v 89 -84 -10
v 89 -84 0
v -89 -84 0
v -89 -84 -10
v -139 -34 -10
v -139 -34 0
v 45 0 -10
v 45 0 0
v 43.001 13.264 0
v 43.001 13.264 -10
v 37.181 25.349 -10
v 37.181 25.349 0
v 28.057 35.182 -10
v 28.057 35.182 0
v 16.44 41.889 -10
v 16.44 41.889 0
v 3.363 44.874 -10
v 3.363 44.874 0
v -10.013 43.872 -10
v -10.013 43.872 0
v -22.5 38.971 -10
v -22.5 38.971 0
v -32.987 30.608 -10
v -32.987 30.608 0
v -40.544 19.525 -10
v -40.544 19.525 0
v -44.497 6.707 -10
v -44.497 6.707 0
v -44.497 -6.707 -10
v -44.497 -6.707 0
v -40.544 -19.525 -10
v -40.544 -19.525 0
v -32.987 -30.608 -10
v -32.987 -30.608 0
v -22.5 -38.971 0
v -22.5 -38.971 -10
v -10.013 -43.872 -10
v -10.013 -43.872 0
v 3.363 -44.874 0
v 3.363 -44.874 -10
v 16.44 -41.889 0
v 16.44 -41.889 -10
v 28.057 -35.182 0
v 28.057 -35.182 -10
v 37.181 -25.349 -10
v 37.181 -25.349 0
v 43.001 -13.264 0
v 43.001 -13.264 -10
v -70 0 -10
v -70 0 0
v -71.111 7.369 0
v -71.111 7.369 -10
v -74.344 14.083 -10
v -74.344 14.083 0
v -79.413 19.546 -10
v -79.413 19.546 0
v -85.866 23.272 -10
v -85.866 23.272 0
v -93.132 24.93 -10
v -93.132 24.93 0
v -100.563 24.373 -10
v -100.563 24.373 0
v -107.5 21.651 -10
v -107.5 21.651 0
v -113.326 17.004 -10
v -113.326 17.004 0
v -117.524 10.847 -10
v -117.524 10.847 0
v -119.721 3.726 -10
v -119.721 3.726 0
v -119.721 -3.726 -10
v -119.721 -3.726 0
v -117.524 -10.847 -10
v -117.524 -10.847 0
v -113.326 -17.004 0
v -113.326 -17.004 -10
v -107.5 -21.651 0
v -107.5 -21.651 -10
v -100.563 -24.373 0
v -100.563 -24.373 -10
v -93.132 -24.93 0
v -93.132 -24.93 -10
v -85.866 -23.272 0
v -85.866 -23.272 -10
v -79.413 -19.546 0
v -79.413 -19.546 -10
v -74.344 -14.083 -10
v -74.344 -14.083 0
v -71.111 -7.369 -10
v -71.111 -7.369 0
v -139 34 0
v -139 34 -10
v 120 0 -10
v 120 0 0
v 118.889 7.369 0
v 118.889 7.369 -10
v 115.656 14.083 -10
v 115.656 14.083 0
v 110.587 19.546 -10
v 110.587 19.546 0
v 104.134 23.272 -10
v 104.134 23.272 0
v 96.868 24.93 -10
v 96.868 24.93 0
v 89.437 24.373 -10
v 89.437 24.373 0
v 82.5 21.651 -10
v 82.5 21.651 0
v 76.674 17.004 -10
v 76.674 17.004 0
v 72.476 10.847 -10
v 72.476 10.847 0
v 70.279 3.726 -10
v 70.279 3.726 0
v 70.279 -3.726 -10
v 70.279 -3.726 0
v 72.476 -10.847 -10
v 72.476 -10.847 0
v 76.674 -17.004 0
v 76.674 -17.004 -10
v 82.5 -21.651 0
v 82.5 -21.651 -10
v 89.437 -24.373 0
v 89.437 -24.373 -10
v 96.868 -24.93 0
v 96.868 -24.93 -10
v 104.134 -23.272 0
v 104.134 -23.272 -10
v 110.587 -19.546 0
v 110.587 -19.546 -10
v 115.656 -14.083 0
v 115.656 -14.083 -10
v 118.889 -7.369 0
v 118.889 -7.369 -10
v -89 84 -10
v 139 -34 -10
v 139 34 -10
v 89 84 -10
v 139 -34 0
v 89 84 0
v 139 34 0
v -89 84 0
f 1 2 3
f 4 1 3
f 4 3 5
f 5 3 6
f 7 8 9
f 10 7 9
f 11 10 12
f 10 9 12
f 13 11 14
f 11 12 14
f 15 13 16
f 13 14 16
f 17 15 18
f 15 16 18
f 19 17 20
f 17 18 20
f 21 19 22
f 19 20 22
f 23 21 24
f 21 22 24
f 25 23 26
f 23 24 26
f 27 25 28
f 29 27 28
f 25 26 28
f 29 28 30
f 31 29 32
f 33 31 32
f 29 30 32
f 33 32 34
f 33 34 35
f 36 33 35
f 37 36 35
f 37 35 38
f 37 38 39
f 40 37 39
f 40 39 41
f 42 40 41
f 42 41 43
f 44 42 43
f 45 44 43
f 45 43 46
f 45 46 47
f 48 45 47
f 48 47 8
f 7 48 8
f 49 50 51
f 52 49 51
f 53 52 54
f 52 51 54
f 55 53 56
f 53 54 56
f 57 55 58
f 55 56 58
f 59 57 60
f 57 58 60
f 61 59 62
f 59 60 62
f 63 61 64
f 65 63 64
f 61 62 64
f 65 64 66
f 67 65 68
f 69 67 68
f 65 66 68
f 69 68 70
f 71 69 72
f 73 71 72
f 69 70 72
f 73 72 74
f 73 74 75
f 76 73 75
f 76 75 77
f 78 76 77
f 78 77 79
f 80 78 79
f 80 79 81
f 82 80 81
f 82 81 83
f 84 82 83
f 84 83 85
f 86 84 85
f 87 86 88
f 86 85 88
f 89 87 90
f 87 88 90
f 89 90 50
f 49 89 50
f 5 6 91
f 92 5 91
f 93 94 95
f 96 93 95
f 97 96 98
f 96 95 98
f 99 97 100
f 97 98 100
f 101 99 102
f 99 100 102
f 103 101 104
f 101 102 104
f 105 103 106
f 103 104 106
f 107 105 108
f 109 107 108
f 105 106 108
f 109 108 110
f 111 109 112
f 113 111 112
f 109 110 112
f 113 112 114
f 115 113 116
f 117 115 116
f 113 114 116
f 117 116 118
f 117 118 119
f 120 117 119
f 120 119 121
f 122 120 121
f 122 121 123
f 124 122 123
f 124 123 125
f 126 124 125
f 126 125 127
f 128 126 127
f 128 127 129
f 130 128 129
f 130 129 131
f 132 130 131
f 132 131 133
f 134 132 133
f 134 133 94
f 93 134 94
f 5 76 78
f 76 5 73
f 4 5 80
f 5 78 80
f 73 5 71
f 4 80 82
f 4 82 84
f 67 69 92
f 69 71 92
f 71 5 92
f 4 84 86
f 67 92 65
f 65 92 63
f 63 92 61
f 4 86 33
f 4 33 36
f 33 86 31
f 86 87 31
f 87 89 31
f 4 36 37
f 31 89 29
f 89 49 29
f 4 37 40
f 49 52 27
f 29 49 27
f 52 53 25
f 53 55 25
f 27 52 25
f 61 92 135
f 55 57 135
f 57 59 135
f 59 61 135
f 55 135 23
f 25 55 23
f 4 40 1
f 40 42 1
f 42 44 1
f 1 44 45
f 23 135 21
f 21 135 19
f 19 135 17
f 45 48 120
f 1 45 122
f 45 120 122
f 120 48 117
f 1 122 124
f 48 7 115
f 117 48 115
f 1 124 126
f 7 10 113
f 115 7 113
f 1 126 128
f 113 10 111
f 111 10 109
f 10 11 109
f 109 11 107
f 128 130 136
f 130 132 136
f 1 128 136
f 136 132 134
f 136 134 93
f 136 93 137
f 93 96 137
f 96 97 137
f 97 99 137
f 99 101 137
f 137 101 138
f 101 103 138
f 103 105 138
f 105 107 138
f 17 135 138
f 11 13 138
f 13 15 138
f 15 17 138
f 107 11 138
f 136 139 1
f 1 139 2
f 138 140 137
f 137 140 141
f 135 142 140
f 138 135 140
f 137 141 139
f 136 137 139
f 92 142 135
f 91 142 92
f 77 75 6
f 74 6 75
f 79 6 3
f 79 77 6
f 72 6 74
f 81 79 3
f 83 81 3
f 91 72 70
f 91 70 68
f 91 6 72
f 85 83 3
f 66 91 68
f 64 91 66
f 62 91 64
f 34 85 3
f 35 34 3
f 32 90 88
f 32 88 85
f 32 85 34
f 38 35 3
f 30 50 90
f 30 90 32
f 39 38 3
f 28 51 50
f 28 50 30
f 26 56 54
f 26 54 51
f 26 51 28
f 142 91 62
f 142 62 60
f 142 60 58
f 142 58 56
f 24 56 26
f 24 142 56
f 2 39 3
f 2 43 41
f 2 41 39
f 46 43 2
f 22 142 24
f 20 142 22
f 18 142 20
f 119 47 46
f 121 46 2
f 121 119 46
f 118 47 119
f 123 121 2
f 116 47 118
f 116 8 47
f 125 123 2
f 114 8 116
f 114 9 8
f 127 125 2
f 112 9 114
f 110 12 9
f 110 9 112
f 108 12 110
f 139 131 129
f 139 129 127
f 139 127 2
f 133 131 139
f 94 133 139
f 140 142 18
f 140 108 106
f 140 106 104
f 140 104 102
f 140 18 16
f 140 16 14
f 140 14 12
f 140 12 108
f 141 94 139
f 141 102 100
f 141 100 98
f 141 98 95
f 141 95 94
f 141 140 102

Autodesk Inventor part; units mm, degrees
ref_plane "YZ Plane" through (0, 0, 0) normal (1, 0, 0) x (0, 1, 0)
ref_plane "XZ Plane" through (0, 0, 0) normal (0, 1, 0) x (-1, 0, 0)
ref_plane "XY Plane" through (0, 0, 0) normal (0, 0, 1) x (1, 0, 0)
sketch "Sketch1" plane through (0, 0, 0) normal (0, 0, 1) x (1, 0, 0)
  line L0 (0, 117.6) -> (0, -117.6) projected
  line L1 (-194.6, 0) -> (194.6, 0) projected
  line L2 (-89, 84) -> (89, 84)
  line L3 (139, 34) -> (139, -34)
  line L4 (89, -84) -> (-89, -84)
  line L5 (-139, -34) -> (-139, 34)
  circle A0 centre (-95, 0) radius 25
  circle A1 centre (95, 0) radius 25
  circle A2 centre (0, 0) radius 45
  line L6 (-89, 84) -> (-139, 34)
  line L7 (89, 84) -> (139, 34)
  line L8 (139, -34) -> (89, -84)
  line L9 (-89, -84) -> (-139, -34)
  point P0 (-139, 84)
  point P1 (139, 84)
  point P2 (-139, -84)
  point P3 (139, -84)
  dimension "d0" = 278
  dimension "d1" = 168
  dimension "d8" = 50
  dimension "d9" = 190
  dimension "d10" = 95
  dimension "d11" = 90
  dimension "d12" = 50
  dimension "d13" = 50
  dimension "d14" = 50
  dimension "d15" = 50
  dimension "d16" = 50
  dimension "d17" = 50
  dimension "d18" = 50
  dimension "d19" = 50
extrude "Extrusion2" add sketch "Sketch1" against normal blind 10 contours L2 L7 L3 L1 A1 A2 L0 | L0 A2 L1 A0 L5 L6 L2 | L1 A1 L3 L8 L4 L0 A2 | A2 L0 L4 L9 L5 L1 A0
equation "\"d13\" = d12"
equation "\"d14\" = d12"
equation "\"d15\" = d14"
equation "\"d16\" = d12"
equation "\"d17\" = d16"
equation "\"d18\" = d12"
equation "\"d19\" = d18"
properties part number "SlipersLåda 211018004"
